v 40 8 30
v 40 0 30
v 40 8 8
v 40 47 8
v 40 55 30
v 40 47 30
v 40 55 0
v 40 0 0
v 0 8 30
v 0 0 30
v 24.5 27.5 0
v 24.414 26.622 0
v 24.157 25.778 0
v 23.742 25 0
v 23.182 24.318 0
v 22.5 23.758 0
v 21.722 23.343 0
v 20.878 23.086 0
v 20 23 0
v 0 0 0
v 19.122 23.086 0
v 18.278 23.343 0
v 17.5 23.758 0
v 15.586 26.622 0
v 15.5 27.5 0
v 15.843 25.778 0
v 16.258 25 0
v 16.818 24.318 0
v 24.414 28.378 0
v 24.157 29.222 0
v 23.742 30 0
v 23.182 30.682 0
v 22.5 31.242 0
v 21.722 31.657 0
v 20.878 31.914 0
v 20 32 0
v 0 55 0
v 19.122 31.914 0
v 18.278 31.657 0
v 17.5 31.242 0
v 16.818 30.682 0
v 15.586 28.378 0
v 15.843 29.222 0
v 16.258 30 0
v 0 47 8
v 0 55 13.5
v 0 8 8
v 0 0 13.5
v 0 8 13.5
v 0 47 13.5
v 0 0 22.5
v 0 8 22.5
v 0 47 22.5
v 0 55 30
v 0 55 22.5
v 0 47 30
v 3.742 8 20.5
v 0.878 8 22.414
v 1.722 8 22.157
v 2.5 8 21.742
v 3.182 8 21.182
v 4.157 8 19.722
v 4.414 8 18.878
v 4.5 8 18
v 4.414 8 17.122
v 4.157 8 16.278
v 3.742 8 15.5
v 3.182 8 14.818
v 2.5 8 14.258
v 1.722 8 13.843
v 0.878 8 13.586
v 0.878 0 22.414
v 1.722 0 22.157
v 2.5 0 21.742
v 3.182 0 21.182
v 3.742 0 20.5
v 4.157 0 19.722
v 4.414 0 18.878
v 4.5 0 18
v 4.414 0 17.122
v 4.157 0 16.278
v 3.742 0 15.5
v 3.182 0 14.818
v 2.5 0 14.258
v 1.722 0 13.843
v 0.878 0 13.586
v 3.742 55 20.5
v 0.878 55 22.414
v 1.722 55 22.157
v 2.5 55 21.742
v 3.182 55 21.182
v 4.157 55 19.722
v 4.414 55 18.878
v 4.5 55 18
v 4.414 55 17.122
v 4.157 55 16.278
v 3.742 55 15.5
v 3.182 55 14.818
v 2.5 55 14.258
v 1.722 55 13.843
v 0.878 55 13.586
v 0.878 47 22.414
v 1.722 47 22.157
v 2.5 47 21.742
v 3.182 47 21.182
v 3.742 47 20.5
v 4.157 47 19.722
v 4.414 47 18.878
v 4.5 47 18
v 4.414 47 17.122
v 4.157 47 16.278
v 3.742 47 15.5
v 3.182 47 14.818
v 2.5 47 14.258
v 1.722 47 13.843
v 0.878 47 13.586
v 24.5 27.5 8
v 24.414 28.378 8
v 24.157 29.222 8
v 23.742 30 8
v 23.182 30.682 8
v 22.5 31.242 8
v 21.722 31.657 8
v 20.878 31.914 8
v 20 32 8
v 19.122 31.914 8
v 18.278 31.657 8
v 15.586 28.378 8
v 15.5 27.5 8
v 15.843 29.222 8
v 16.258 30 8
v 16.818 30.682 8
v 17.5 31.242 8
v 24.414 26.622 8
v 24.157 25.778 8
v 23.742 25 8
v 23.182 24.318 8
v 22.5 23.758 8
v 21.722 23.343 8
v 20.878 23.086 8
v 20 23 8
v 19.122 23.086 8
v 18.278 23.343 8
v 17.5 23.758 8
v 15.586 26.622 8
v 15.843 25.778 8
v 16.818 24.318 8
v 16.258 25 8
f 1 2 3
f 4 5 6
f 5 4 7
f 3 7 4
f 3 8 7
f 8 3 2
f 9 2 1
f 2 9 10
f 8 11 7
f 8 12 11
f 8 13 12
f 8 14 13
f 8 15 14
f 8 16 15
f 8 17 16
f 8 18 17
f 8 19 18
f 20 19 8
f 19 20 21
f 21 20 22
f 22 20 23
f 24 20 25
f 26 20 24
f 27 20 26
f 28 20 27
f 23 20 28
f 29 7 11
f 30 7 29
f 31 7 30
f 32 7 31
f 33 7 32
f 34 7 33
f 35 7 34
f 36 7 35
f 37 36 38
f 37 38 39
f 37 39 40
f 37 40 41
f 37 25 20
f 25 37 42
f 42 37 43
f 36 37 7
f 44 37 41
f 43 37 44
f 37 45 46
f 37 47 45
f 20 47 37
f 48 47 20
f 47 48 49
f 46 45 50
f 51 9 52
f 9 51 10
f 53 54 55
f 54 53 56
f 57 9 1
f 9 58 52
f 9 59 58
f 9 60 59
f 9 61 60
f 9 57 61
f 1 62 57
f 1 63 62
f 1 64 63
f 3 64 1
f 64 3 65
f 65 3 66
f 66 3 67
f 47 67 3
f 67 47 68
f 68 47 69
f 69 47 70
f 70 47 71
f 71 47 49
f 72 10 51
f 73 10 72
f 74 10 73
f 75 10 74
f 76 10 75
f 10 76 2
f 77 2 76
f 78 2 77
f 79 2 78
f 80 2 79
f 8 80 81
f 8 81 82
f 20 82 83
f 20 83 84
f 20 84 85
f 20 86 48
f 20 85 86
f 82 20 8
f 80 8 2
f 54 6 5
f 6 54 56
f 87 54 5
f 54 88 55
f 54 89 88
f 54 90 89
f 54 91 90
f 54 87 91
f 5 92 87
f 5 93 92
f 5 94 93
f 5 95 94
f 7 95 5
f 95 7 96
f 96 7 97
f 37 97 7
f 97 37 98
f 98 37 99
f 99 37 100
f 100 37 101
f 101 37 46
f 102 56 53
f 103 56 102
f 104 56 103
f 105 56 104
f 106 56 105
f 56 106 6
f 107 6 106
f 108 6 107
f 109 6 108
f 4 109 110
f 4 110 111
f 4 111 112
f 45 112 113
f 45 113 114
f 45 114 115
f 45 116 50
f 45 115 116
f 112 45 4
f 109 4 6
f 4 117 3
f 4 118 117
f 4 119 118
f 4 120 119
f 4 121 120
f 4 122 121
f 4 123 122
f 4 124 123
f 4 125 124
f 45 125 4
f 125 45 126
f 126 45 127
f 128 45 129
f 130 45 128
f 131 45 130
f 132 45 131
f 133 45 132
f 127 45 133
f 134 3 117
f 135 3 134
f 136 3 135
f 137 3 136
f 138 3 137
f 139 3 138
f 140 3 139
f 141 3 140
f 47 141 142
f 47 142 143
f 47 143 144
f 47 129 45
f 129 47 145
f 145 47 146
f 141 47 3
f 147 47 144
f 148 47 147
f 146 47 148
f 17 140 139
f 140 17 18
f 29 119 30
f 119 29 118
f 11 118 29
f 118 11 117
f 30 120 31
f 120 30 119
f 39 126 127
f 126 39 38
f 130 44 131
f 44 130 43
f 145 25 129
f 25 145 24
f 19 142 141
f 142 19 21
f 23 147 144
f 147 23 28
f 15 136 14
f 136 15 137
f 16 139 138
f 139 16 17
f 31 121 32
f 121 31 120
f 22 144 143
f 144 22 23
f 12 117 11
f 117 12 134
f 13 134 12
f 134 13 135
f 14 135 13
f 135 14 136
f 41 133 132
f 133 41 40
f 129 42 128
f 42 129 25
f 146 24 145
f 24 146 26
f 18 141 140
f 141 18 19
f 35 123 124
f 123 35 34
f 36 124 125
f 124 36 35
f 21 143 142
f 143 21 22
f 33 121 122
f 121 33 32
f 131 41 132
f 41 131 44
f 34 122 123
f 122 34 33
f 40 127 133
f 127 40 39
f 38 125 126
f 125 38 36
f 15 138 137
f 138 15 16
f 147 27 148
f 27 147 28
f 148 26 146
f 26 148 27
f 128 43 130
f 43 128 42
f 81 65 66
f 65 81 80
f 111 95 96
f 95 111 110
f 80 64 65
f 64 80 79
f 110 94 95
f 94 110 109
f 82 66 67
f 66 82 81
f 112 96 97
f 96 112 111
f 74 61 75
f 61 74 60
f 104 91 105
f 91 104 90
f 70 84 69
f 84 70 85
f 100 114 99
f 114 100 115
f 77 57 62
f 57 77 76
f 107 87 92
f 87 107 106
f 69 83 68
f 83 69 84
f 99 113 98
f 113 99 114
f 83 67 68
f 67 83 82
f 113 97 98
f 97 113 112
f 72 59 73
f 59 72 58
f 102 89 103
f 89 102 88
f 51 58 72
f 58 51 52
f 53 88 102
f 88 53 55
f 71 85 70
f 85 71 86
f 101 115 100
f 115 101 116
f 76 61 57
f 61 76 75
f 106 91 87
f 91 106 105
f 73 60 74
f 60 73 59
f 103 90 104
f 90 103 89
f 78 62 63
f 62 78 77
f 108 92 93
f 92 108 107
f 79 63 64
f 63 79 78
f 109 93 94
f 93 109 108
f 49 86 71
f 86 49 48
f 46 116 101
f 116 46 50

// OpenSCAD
$fn = 32;

// ----------------------------------------------------------------------
// U-bracket: 40 x 55 x 30 mm
// ----------------------------------------------------------------------

// --- parameters (mm) ---
length = 40;              // outer length, X
width = 55;               // outer width, Y
height = 30;              // upright height, Z
thick = 8;                // wall thickness
hole_d = 9;               // clearance for M8

module hole_z(px, py) {
  translate([px, py, -0.5]) cylinder(h = thick + 1, d = hole_d);
}
module hole_y_pz(pz) {
  /* through both uprights along Y */
  translate([0, -0.5, pz]) rotate([-90, 0, 0]) cylinder(h = width + 1, d = hole_d);
}

module base() {
  cube([length, width, thick]);
}

module uprights() {
  cube([length, thick, height]);
  translate([0, width - thick, 0]) cube([length, thick, height]);
}

difference() {
  union() {
    base();
    uprights();
  }
  hole_z(20, 27.5);
  hole_y_pz(18);
}
